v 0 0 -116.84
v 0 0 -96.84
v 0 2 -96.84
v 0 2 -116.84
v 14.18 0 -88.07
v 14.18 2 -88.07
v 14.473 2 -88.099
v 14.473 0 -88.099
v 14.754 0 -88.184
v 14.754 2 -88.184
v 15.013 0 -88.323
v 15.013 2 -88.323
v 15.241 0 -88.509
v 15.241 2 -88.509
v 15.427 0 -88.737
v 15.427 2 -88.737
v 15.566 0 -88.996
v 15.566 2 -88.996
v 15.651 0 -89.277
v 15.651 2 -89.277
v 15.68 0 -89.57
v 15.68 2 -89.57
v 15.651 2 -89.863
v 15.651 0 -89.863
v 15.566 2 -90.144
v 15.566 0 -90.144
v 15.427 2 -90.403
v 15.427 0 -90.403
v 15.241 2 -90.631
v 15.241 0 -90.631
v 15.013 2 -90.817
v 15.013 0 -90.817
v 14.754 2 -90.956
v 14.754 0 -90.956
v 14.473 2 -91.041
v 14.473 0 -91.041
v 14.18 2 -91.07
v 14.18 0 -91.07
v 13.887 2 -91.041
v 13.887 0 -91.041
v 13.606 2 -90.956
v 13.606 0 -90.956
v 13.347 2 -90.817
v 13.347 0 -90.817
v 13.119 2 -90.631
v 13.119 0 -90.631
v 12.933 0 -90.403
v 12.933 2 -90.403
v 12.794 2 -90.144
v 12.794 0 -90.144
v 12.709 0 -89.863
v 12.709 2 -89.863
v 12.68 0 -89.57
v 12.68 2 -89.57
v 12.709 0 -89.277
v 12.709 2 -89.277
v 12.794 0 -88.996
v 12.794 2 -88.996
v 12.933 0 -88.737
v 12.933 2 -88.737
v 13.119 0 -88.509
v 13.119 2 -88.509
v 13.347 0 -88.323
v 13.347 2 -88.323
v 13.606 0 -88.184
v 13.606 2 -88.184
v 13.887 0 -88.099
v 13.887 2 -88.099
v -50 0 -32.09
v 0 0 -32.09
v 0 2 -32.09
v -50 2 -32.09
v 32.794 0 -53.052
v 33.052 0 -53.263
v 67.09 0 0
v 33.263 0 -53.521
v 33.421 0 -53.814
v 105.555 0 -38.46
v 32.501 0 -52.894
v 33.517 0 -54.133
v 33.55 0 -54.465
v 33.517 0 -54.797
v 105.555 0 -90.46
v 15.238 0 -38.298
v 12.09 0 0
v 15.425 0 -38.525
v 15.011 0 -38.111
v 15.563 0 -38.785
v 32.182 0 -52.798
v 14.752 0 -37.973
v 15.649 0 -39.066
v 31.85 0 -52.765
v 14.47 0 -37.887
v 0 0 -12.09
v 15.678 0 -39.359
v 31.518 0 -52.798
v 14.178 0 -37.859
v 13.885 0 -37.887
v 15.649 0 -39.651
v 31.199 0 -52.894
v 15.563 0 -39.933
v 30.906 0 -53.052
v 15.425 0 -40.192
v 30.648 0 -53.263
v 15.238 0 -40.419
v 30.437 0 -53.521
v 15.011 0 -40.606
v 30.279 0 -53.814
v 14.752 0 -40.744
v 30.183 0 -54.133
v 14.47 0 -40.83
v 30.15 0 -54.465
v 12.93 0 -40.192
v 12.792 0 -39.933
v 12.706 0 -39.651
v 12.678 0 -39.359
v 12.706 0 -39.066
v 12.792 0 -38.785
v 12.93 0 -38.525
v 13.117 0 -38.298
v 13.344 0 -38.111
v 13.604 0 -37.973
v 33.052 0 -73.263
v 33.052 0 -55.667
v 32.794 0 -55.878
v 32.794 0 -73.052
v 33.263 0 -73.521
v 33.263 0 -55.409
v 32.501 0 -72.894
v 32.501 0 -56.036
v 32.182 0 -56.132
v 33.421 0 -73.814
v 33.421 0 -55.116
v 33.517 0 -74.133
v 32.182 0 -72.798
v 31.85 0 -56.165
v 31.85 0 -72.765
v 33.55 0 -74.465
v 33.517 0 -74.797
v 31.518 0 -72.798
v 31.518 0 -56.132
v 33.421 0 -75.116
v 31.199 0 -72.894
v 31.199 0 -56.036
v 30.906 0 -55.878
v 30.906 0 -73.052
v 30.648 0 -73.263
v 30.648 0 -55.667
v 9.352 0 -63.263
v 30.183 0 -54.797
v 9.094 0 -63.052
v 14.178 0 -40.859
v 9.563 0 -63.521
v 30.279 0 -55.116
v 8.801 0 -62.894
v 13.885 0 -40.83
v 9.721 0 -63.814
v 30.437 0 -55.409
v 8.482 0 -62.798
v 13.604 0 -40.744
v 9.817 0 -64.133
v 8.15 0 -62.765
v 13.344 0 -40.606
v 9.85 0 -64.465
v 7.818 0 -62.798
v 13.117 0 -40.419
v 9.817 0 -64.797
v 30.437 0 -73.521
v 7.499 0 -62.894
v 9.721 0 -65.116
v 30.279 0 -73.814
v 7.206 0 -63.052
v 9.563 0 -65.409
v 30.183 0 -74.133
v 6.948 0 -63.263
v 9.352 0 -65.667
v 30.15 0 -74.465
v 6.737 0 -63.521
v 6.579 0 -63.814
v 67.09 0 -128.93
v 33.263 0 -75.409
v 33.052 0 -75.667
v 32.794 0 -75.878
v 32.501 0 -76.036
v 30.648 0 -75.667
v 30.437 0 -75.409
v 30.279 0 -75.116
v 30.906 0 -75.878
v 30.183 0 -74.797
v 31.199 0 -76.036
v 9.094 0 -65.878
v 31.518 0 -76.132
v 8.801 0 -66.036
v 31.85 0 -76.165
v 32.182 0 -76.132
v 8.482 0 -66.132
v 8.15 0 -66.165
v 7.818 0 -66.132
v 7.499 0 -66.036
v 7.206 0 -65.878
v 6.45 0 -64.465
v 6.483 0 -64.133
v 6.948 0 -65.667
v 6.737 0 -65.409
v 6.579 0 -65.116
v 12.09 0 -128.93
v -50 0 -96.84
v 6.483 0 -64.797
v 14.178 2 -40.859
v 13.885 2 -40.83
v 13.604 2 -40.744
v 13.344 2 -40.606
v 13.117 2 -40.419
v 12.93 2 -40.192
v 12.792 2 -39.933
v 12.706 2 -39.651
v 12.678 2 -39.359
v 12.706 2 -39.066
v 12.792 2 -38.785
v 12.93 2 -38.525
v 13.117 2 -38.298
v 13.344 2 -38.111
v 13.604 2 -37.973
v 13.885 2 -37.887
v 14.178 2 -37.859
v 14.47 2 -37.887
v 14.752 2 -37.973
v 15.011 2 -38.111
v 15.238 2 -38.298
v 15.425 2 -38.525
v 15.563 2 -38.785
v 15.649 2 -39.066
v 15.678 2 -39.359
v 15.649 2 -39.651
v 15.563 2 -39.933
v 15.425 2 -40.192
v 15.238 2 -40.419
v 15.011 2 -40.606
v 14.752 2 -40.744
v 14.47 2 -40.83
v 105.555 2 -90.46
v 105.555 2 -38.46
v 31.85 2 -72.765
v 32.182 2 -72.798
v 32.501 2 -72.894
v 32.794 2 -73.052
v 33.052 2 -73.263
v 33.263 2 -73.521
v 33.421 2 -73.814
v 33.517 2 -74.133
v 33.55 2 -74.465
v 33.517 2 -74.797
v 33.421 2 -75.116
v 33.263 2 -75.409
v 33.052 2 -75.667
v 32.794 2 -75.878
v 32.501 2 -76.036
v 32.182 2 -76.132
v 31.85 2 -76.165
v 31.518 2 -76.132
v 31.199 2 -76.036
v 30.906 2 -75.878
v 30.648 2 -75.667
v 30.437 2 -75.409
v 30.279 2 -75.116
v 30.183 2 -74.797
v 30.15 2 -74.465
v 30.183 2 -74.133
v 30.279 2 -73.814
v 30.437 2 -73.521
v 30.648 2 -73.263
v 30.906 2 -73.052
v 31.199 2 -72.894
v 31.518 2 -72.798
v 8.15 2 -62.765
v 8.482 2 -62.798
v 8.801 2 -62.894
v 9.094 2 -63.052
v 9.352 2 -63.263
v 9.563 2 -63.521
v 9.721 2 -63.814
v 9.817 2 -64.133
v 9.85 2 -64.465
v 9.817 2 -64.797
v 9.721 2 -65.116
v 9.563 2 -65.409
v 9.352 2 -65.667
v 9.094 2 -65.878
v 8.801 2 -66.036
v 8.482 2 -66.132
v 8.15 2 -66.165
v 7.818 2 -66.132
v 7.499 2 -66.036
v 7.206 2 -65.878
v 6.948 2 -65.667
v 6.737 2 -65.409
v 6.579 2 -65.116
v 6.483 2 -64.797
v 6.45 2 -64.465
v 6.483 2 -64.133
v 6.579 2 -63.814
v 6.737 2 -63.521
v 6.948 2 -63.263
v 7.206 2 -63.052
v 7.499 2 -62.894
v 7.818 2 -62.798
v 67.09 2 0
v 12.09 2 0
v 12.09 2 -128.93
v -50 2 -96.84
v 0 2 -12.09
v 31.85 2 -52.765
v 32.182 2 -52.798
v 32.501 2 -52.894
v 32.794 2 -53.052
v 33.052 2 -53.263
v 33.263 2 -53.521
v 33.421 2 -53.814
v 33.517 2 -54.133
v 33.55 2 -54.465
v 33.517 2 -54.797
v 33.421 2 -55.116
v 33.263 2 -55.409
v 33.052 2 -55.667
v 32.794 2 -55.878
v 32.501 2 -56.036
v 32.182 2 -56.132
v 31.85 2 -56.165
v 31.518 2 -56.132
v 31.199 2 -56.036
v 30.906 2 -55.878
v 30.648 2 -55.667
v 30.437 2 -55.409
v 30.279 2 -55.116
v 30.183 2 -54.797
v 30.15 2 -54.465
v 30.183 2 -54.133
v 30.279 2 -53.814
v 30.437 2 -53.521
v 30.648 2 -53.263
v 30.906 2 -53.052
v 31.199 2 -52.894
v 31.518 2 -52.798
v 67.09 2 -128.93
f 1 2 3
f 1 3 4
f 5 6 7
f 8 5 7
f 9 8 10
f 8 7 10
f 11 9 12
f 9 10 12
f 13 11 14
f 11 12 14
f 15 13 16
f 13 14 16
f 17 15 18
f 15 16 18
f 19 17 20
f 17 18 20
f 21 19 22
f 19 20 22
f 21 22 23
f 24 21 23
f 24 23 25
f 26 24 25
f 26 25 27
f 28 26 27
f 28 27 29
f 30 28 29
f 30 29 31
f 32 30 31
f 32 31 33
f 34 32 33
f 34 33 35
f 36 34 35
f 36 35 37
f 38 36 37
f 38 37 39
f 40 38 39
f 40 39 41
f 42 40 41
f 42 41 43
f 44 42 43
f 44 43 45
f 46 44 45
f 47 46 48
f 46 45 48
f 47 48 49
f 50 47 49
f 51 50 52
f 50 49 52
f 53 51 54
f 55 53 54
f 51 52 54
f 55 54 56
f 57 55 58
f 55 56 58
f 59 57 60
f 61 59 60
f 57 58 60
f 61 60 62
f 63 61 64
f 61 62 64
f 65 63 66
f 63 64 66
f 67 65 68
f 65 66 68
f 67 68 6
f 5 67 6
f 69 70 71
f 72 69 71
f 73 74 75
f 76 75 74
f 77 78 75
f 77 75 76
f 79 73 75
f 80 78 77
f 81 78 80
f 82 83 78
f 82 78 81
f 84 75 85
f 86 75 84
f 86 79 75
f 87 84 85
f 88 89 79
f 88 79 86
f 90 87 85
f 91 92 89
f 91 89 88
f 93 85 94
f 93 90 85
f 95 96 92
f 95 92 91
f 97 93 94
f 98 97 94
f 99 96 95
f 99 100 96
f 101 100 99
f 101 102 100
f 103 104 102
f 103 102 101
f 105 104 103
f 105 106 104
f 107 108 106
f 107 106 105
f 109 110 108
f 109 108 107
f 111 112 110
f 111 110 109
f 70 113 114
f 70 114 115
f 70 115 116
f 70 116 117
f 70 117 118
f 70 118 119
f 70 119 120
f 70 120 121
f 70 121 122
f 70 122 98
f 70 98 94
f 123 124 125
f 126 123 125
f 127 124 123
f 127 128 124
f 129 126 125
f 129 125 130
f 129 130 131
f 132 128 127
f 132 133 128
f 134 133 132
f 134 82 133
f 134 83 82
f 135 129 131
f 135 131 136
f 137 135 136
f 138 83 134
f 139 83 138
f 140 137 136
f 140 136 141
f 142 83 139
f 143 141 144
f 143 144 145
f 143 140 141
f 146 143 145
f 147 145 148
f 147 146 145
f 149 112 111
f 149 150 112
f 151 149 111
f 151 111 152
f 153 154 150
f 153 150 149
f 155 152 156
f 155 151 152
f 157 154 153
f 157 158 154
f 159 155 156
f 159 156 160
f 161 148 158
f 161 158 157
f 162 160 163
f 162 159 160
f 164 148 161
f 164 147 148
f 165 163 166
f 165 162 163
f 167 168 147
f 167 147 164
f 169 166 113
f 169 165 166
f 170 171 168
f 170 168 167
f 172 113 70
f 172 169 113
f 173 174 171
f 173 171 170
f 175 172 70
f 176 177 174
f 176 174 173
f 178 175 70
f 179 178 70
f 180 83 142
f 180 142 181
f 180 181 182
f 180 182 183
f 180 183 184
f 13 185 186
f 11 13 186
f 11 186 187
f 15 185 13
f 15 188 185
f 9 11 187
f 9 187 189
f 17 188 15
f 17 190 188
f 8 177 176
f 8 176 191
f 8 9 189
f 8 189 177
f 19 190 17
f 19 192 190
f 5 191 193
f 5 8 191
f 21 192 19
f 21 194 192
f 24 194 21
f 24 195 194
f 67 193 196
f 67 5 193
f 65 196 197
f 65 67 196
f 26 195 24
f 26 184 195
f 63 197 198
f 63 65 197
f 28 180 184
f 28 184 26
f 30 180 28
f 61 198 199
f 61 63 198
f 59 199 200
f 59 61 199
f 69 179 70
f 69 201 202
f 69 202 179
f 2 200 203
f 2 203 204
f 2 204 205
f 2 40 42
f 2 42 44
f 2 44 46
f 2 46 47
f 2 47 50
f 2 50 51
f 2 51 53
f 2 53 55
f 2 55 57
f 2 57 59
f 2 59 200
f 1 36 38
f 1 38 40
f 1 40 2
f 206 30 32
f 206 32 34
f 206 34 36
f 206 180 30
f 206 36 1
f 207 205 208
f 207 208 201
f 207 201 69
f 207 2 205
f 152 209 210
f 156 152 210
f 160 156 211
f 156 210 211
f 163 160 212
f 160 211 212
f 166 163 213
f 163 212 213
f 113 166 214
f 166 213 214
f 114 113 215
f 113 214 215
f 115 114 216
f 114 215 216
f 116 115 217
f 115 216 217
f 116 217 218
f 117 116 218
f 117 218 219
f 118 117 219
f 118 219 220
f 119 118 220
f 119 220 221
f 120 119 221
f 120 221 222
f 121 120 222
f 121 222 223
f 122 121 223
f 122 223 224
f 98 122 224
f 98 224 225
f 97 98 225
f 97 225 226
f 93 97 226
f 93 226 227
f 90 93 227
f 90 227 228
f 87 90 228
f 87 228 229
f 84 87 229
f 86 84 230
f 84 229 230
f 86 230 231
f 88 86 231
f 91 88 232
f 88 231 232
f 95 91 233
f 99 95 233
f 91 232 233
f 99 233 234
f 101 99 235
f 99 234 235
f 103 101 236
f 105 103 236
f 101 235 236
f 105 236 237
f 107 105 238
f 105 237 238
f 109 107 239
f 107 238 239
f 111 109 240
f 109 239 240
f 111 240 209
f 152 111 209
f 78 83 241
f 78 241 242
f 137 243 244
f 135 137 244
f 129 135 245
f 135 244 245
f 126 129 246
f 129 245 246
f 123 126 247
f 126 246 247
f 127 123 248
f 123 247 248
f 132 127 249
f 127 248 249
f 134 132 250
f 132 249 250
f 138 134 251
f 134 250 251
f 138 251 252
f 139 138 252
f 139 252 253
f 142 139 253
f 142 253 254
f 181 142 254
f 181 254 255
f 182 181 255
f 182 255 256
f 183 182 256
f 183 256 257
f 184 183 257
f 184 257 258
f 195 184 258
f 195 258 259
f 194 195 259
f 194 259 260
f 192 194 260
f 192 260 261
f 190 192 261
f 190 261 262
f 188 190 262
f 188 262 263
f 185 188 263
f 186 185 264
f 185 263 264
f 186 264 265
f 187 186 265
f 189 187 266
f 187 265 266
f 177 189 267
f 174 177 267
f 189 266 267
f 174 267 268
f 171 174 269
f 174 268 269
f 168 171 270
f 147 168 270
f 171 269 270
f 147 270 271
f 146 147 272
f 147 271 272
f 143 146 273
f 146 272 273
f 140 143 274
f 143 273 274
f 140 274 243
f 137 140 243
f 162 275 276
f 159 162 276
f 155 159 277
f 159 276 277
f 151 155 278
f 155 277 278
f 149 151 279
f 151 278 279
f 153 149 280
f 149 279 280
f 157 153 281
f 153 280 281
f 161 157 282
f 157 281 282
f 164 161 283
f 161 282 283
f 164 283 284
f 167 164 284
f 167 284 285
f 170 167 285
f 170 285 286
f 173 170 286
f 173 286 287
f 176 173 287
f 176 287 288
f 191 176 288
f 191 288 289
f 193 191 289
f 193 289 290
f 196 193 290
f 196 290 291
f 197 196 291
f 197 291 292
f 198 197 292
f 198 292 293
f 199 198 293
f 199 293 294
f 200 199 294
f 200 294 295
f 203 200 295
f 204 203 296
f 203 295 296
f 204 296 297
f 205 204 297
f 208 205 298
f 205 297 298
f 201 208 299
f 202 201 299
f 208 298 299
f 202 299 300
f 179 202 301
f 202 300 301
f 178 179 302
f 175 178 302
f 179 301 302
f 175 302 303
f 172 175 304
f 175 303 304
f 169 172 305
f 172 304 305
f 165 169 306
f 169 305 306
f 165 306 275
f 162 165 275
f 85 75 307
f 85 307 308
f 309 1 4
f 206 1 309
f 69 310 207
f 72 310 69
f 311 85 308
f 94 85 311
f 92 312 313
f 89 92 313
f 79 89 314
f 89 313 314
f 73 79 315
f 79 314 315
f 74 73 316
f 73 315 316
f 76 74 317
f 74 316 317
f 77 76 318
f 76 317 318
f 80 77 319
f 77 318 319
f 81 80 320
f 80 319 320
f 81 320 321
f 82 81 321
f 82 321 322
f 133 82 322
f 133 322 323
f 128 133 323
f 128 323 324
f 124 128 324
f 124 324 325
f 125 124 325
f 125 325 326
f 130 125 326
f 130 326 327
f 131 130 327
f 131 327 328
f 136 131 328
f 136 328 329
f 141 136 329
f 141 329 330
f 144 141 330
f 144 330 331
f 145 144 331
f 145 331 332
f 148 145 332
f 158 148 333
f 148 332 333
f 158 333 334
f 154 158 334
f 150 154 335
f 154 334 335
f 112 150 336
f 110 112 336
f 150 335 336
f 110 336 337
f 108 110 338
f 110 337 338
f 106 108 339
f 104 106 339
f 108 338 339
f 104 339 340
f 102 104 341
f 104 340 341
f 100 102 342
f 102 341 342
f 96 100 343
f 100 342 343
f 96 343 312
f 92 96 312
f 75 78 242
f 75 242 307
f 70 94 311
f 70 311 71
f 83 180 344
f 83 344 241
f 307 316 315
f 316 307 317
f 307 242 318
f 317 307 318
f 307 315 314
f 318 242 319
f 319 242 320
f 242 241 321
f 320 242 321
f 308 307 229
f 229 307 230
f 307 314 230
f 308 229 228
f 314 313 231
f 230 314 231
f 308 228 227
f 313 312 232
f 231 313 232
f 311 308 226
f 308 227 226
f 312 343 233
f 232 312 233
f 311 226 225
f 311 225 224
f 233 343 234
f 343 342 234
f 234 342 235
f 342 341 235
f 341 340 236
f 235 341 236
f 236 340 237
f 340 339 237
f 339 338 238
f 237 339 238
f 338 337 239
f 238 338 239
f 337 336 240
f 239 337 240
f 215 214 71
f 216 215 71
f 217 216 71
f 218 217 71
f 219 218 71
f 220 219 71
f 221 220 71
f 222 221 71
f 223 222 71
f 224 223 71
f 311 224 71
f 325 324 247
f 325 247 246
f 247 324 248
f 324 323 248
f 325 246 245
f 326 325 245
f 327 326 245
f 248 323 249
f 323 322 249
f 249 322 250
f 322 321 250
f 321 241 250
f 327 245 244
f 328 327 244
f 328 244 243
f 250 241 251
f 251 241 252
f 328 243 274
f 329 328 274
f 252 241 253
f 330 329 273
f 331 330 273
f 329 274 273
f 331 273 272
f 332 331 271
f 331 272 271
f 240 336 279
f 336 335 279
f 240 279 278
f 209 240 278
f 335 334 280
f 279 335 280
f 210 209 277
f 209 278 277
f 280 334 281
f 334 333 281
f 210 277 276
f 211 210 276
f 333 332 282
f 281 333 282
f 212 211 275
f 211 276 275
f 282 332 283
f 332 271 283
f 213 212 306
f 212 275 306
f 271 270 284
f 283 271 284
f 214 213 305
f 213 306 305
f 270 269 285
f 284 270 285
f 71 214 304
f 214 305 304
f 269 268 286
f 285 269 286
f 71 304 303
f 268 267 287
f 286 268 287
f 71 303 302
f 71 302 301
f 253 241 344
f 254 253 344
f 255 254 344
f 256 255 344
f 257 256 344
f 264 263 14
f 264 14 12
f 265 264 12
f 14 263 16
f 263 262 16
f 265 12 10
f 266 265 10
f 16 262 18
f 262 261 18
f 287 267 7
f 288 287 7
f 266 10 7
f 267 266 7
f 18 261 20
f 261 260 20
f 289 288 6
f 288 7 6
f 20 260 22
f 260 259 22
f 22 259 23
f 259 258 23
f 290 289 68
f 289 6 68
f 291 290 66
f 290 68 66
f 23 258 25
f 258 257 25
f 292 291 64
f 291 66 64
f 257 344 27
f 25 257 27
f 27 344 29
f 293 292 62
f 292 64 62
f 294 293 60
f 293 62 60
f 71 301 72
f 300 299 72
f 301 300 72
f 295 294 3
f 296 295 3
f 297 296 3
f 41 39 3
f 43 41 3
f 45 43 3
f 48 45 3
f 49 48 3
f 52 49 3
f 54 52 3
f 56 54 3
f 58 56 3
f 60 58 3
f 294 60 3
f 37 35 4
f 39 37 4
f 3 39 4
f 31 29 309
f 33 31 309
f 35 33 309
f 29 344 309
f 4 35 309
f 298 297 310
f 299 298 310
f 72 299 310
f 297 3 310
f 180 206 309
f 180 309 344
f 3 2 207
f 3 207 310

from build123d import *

# Parameters (mm, degrees)
BOSS_EXTRUDE1_DEPTH = 2
SKETCH2_R           = 1.7
CUT_EXTRUDE1_DEPTH  = 167.639739727
CUT_EXTRUDE2_REACH  = 168.64
SKETCH7_R           = 1.5
SKETCH10_W          = 64.75
SKETCH10_H          = 2
BOSS_EXTRUDE3_DEPTH = 50


with BuildPart() as part:
    # Sketch1 → Boss-Extrude1 (new body)
    with BuildSketch(Plane(origin=(0, 0, 0), x_dir=(1, 0, 0), z_dir=(0, 1, 0))):
        Polygon((0, 12.09), (0, 116.84), (12.09, 128.93), (67.09, 128.93), (105.554999675, 90.46), (105.554999675, 38.46), (67.09, 0), (12.09, 0), align=None)
    extrude(amount=BOSS_EXTRUDE1_DEPTH)

    # Sketch2 → Cut-Extrude1 (cut, through all)
    with BuildSketch(Plane(origin=(0, 2, 0), x_dir=(1, 0, 0), z_dir=(0, 1, 0))):
        with Locations(Location((8.15, 64.465, 0), (0, 0, 270))):
            Circle(SKETCH2_R)
        with Locations(Location((31.85, 54.465, 0), (0, 0, 270))):
            Circle(SKETCH2_R)
        with Locations(Location((31.85, 74.465, 0), (0, 0, 270))):
            Circle(SKETCH2_R)
    extrude(amount=-CUT_EXTRUDE1_DEPTH, mode=Mode.SUBTRACT)

    # Sketch7 → Cut-Extrude2 (cut, up to next)
    with BuildSketch(Plane(origin=(0, 2, 0), x_dir=(1, 0, 0), z_dir=(0, 1, 0)), mode=Mode.PRIVATE) as cut_extrude2_sk1:
        with Locations(Location((14.18, 89.57, 0), (0, 0, 270))):
            Circle(SKETCH7_R)
    cut_extrude2_tool1 = extrude(cut_extrude2_sk1.sketch, amount=-CUT_EXTRUDE2_REACH, mode=Mode.PRIVATE) & part.part
    # Sketch7 → Cut-Extrude2 (cut, up to next)
    with BuildSketch(Plane(origin=(0, 2, 0), x_dir=(1, 0, 0), z_dir=(0, 1, 0)), mode=Mode.PRIVATE) as cut_extrude2_sk2:
        with Locations(Location((14.177621555, 39.358656737, 0), (0, 0, 90))):
            Circle(SKETCH7_R)
    cut_extrude2_tool2 = extrude(cut_extrude2_sk2.sketch, amount=-CUT_EXTRUDE2_REACH, mode=Mode.PRIVATE) & part.part
    add(cut_extrude2_tool1.solids().sort_by_distance((14.18, 2, -89.57))[0], mode=Mode.SUBTRACT)
    add(cut_extrude2_tool2.solids().sort_by_distance((14.177622, 2, -39.358657))[0], mode=Mode.SUBTRACT)

    # Sketch10 → Boss-Extrude3 (add)
    with BuildSketch(Plane.ZY):
        with Locations((-64.465, 1)):
            Rectangle(SKETCH10_W, SKETCH10_H)
    extrude(amount=BOSS_EXTRUDE3_DEPTH)


solid = part.part
